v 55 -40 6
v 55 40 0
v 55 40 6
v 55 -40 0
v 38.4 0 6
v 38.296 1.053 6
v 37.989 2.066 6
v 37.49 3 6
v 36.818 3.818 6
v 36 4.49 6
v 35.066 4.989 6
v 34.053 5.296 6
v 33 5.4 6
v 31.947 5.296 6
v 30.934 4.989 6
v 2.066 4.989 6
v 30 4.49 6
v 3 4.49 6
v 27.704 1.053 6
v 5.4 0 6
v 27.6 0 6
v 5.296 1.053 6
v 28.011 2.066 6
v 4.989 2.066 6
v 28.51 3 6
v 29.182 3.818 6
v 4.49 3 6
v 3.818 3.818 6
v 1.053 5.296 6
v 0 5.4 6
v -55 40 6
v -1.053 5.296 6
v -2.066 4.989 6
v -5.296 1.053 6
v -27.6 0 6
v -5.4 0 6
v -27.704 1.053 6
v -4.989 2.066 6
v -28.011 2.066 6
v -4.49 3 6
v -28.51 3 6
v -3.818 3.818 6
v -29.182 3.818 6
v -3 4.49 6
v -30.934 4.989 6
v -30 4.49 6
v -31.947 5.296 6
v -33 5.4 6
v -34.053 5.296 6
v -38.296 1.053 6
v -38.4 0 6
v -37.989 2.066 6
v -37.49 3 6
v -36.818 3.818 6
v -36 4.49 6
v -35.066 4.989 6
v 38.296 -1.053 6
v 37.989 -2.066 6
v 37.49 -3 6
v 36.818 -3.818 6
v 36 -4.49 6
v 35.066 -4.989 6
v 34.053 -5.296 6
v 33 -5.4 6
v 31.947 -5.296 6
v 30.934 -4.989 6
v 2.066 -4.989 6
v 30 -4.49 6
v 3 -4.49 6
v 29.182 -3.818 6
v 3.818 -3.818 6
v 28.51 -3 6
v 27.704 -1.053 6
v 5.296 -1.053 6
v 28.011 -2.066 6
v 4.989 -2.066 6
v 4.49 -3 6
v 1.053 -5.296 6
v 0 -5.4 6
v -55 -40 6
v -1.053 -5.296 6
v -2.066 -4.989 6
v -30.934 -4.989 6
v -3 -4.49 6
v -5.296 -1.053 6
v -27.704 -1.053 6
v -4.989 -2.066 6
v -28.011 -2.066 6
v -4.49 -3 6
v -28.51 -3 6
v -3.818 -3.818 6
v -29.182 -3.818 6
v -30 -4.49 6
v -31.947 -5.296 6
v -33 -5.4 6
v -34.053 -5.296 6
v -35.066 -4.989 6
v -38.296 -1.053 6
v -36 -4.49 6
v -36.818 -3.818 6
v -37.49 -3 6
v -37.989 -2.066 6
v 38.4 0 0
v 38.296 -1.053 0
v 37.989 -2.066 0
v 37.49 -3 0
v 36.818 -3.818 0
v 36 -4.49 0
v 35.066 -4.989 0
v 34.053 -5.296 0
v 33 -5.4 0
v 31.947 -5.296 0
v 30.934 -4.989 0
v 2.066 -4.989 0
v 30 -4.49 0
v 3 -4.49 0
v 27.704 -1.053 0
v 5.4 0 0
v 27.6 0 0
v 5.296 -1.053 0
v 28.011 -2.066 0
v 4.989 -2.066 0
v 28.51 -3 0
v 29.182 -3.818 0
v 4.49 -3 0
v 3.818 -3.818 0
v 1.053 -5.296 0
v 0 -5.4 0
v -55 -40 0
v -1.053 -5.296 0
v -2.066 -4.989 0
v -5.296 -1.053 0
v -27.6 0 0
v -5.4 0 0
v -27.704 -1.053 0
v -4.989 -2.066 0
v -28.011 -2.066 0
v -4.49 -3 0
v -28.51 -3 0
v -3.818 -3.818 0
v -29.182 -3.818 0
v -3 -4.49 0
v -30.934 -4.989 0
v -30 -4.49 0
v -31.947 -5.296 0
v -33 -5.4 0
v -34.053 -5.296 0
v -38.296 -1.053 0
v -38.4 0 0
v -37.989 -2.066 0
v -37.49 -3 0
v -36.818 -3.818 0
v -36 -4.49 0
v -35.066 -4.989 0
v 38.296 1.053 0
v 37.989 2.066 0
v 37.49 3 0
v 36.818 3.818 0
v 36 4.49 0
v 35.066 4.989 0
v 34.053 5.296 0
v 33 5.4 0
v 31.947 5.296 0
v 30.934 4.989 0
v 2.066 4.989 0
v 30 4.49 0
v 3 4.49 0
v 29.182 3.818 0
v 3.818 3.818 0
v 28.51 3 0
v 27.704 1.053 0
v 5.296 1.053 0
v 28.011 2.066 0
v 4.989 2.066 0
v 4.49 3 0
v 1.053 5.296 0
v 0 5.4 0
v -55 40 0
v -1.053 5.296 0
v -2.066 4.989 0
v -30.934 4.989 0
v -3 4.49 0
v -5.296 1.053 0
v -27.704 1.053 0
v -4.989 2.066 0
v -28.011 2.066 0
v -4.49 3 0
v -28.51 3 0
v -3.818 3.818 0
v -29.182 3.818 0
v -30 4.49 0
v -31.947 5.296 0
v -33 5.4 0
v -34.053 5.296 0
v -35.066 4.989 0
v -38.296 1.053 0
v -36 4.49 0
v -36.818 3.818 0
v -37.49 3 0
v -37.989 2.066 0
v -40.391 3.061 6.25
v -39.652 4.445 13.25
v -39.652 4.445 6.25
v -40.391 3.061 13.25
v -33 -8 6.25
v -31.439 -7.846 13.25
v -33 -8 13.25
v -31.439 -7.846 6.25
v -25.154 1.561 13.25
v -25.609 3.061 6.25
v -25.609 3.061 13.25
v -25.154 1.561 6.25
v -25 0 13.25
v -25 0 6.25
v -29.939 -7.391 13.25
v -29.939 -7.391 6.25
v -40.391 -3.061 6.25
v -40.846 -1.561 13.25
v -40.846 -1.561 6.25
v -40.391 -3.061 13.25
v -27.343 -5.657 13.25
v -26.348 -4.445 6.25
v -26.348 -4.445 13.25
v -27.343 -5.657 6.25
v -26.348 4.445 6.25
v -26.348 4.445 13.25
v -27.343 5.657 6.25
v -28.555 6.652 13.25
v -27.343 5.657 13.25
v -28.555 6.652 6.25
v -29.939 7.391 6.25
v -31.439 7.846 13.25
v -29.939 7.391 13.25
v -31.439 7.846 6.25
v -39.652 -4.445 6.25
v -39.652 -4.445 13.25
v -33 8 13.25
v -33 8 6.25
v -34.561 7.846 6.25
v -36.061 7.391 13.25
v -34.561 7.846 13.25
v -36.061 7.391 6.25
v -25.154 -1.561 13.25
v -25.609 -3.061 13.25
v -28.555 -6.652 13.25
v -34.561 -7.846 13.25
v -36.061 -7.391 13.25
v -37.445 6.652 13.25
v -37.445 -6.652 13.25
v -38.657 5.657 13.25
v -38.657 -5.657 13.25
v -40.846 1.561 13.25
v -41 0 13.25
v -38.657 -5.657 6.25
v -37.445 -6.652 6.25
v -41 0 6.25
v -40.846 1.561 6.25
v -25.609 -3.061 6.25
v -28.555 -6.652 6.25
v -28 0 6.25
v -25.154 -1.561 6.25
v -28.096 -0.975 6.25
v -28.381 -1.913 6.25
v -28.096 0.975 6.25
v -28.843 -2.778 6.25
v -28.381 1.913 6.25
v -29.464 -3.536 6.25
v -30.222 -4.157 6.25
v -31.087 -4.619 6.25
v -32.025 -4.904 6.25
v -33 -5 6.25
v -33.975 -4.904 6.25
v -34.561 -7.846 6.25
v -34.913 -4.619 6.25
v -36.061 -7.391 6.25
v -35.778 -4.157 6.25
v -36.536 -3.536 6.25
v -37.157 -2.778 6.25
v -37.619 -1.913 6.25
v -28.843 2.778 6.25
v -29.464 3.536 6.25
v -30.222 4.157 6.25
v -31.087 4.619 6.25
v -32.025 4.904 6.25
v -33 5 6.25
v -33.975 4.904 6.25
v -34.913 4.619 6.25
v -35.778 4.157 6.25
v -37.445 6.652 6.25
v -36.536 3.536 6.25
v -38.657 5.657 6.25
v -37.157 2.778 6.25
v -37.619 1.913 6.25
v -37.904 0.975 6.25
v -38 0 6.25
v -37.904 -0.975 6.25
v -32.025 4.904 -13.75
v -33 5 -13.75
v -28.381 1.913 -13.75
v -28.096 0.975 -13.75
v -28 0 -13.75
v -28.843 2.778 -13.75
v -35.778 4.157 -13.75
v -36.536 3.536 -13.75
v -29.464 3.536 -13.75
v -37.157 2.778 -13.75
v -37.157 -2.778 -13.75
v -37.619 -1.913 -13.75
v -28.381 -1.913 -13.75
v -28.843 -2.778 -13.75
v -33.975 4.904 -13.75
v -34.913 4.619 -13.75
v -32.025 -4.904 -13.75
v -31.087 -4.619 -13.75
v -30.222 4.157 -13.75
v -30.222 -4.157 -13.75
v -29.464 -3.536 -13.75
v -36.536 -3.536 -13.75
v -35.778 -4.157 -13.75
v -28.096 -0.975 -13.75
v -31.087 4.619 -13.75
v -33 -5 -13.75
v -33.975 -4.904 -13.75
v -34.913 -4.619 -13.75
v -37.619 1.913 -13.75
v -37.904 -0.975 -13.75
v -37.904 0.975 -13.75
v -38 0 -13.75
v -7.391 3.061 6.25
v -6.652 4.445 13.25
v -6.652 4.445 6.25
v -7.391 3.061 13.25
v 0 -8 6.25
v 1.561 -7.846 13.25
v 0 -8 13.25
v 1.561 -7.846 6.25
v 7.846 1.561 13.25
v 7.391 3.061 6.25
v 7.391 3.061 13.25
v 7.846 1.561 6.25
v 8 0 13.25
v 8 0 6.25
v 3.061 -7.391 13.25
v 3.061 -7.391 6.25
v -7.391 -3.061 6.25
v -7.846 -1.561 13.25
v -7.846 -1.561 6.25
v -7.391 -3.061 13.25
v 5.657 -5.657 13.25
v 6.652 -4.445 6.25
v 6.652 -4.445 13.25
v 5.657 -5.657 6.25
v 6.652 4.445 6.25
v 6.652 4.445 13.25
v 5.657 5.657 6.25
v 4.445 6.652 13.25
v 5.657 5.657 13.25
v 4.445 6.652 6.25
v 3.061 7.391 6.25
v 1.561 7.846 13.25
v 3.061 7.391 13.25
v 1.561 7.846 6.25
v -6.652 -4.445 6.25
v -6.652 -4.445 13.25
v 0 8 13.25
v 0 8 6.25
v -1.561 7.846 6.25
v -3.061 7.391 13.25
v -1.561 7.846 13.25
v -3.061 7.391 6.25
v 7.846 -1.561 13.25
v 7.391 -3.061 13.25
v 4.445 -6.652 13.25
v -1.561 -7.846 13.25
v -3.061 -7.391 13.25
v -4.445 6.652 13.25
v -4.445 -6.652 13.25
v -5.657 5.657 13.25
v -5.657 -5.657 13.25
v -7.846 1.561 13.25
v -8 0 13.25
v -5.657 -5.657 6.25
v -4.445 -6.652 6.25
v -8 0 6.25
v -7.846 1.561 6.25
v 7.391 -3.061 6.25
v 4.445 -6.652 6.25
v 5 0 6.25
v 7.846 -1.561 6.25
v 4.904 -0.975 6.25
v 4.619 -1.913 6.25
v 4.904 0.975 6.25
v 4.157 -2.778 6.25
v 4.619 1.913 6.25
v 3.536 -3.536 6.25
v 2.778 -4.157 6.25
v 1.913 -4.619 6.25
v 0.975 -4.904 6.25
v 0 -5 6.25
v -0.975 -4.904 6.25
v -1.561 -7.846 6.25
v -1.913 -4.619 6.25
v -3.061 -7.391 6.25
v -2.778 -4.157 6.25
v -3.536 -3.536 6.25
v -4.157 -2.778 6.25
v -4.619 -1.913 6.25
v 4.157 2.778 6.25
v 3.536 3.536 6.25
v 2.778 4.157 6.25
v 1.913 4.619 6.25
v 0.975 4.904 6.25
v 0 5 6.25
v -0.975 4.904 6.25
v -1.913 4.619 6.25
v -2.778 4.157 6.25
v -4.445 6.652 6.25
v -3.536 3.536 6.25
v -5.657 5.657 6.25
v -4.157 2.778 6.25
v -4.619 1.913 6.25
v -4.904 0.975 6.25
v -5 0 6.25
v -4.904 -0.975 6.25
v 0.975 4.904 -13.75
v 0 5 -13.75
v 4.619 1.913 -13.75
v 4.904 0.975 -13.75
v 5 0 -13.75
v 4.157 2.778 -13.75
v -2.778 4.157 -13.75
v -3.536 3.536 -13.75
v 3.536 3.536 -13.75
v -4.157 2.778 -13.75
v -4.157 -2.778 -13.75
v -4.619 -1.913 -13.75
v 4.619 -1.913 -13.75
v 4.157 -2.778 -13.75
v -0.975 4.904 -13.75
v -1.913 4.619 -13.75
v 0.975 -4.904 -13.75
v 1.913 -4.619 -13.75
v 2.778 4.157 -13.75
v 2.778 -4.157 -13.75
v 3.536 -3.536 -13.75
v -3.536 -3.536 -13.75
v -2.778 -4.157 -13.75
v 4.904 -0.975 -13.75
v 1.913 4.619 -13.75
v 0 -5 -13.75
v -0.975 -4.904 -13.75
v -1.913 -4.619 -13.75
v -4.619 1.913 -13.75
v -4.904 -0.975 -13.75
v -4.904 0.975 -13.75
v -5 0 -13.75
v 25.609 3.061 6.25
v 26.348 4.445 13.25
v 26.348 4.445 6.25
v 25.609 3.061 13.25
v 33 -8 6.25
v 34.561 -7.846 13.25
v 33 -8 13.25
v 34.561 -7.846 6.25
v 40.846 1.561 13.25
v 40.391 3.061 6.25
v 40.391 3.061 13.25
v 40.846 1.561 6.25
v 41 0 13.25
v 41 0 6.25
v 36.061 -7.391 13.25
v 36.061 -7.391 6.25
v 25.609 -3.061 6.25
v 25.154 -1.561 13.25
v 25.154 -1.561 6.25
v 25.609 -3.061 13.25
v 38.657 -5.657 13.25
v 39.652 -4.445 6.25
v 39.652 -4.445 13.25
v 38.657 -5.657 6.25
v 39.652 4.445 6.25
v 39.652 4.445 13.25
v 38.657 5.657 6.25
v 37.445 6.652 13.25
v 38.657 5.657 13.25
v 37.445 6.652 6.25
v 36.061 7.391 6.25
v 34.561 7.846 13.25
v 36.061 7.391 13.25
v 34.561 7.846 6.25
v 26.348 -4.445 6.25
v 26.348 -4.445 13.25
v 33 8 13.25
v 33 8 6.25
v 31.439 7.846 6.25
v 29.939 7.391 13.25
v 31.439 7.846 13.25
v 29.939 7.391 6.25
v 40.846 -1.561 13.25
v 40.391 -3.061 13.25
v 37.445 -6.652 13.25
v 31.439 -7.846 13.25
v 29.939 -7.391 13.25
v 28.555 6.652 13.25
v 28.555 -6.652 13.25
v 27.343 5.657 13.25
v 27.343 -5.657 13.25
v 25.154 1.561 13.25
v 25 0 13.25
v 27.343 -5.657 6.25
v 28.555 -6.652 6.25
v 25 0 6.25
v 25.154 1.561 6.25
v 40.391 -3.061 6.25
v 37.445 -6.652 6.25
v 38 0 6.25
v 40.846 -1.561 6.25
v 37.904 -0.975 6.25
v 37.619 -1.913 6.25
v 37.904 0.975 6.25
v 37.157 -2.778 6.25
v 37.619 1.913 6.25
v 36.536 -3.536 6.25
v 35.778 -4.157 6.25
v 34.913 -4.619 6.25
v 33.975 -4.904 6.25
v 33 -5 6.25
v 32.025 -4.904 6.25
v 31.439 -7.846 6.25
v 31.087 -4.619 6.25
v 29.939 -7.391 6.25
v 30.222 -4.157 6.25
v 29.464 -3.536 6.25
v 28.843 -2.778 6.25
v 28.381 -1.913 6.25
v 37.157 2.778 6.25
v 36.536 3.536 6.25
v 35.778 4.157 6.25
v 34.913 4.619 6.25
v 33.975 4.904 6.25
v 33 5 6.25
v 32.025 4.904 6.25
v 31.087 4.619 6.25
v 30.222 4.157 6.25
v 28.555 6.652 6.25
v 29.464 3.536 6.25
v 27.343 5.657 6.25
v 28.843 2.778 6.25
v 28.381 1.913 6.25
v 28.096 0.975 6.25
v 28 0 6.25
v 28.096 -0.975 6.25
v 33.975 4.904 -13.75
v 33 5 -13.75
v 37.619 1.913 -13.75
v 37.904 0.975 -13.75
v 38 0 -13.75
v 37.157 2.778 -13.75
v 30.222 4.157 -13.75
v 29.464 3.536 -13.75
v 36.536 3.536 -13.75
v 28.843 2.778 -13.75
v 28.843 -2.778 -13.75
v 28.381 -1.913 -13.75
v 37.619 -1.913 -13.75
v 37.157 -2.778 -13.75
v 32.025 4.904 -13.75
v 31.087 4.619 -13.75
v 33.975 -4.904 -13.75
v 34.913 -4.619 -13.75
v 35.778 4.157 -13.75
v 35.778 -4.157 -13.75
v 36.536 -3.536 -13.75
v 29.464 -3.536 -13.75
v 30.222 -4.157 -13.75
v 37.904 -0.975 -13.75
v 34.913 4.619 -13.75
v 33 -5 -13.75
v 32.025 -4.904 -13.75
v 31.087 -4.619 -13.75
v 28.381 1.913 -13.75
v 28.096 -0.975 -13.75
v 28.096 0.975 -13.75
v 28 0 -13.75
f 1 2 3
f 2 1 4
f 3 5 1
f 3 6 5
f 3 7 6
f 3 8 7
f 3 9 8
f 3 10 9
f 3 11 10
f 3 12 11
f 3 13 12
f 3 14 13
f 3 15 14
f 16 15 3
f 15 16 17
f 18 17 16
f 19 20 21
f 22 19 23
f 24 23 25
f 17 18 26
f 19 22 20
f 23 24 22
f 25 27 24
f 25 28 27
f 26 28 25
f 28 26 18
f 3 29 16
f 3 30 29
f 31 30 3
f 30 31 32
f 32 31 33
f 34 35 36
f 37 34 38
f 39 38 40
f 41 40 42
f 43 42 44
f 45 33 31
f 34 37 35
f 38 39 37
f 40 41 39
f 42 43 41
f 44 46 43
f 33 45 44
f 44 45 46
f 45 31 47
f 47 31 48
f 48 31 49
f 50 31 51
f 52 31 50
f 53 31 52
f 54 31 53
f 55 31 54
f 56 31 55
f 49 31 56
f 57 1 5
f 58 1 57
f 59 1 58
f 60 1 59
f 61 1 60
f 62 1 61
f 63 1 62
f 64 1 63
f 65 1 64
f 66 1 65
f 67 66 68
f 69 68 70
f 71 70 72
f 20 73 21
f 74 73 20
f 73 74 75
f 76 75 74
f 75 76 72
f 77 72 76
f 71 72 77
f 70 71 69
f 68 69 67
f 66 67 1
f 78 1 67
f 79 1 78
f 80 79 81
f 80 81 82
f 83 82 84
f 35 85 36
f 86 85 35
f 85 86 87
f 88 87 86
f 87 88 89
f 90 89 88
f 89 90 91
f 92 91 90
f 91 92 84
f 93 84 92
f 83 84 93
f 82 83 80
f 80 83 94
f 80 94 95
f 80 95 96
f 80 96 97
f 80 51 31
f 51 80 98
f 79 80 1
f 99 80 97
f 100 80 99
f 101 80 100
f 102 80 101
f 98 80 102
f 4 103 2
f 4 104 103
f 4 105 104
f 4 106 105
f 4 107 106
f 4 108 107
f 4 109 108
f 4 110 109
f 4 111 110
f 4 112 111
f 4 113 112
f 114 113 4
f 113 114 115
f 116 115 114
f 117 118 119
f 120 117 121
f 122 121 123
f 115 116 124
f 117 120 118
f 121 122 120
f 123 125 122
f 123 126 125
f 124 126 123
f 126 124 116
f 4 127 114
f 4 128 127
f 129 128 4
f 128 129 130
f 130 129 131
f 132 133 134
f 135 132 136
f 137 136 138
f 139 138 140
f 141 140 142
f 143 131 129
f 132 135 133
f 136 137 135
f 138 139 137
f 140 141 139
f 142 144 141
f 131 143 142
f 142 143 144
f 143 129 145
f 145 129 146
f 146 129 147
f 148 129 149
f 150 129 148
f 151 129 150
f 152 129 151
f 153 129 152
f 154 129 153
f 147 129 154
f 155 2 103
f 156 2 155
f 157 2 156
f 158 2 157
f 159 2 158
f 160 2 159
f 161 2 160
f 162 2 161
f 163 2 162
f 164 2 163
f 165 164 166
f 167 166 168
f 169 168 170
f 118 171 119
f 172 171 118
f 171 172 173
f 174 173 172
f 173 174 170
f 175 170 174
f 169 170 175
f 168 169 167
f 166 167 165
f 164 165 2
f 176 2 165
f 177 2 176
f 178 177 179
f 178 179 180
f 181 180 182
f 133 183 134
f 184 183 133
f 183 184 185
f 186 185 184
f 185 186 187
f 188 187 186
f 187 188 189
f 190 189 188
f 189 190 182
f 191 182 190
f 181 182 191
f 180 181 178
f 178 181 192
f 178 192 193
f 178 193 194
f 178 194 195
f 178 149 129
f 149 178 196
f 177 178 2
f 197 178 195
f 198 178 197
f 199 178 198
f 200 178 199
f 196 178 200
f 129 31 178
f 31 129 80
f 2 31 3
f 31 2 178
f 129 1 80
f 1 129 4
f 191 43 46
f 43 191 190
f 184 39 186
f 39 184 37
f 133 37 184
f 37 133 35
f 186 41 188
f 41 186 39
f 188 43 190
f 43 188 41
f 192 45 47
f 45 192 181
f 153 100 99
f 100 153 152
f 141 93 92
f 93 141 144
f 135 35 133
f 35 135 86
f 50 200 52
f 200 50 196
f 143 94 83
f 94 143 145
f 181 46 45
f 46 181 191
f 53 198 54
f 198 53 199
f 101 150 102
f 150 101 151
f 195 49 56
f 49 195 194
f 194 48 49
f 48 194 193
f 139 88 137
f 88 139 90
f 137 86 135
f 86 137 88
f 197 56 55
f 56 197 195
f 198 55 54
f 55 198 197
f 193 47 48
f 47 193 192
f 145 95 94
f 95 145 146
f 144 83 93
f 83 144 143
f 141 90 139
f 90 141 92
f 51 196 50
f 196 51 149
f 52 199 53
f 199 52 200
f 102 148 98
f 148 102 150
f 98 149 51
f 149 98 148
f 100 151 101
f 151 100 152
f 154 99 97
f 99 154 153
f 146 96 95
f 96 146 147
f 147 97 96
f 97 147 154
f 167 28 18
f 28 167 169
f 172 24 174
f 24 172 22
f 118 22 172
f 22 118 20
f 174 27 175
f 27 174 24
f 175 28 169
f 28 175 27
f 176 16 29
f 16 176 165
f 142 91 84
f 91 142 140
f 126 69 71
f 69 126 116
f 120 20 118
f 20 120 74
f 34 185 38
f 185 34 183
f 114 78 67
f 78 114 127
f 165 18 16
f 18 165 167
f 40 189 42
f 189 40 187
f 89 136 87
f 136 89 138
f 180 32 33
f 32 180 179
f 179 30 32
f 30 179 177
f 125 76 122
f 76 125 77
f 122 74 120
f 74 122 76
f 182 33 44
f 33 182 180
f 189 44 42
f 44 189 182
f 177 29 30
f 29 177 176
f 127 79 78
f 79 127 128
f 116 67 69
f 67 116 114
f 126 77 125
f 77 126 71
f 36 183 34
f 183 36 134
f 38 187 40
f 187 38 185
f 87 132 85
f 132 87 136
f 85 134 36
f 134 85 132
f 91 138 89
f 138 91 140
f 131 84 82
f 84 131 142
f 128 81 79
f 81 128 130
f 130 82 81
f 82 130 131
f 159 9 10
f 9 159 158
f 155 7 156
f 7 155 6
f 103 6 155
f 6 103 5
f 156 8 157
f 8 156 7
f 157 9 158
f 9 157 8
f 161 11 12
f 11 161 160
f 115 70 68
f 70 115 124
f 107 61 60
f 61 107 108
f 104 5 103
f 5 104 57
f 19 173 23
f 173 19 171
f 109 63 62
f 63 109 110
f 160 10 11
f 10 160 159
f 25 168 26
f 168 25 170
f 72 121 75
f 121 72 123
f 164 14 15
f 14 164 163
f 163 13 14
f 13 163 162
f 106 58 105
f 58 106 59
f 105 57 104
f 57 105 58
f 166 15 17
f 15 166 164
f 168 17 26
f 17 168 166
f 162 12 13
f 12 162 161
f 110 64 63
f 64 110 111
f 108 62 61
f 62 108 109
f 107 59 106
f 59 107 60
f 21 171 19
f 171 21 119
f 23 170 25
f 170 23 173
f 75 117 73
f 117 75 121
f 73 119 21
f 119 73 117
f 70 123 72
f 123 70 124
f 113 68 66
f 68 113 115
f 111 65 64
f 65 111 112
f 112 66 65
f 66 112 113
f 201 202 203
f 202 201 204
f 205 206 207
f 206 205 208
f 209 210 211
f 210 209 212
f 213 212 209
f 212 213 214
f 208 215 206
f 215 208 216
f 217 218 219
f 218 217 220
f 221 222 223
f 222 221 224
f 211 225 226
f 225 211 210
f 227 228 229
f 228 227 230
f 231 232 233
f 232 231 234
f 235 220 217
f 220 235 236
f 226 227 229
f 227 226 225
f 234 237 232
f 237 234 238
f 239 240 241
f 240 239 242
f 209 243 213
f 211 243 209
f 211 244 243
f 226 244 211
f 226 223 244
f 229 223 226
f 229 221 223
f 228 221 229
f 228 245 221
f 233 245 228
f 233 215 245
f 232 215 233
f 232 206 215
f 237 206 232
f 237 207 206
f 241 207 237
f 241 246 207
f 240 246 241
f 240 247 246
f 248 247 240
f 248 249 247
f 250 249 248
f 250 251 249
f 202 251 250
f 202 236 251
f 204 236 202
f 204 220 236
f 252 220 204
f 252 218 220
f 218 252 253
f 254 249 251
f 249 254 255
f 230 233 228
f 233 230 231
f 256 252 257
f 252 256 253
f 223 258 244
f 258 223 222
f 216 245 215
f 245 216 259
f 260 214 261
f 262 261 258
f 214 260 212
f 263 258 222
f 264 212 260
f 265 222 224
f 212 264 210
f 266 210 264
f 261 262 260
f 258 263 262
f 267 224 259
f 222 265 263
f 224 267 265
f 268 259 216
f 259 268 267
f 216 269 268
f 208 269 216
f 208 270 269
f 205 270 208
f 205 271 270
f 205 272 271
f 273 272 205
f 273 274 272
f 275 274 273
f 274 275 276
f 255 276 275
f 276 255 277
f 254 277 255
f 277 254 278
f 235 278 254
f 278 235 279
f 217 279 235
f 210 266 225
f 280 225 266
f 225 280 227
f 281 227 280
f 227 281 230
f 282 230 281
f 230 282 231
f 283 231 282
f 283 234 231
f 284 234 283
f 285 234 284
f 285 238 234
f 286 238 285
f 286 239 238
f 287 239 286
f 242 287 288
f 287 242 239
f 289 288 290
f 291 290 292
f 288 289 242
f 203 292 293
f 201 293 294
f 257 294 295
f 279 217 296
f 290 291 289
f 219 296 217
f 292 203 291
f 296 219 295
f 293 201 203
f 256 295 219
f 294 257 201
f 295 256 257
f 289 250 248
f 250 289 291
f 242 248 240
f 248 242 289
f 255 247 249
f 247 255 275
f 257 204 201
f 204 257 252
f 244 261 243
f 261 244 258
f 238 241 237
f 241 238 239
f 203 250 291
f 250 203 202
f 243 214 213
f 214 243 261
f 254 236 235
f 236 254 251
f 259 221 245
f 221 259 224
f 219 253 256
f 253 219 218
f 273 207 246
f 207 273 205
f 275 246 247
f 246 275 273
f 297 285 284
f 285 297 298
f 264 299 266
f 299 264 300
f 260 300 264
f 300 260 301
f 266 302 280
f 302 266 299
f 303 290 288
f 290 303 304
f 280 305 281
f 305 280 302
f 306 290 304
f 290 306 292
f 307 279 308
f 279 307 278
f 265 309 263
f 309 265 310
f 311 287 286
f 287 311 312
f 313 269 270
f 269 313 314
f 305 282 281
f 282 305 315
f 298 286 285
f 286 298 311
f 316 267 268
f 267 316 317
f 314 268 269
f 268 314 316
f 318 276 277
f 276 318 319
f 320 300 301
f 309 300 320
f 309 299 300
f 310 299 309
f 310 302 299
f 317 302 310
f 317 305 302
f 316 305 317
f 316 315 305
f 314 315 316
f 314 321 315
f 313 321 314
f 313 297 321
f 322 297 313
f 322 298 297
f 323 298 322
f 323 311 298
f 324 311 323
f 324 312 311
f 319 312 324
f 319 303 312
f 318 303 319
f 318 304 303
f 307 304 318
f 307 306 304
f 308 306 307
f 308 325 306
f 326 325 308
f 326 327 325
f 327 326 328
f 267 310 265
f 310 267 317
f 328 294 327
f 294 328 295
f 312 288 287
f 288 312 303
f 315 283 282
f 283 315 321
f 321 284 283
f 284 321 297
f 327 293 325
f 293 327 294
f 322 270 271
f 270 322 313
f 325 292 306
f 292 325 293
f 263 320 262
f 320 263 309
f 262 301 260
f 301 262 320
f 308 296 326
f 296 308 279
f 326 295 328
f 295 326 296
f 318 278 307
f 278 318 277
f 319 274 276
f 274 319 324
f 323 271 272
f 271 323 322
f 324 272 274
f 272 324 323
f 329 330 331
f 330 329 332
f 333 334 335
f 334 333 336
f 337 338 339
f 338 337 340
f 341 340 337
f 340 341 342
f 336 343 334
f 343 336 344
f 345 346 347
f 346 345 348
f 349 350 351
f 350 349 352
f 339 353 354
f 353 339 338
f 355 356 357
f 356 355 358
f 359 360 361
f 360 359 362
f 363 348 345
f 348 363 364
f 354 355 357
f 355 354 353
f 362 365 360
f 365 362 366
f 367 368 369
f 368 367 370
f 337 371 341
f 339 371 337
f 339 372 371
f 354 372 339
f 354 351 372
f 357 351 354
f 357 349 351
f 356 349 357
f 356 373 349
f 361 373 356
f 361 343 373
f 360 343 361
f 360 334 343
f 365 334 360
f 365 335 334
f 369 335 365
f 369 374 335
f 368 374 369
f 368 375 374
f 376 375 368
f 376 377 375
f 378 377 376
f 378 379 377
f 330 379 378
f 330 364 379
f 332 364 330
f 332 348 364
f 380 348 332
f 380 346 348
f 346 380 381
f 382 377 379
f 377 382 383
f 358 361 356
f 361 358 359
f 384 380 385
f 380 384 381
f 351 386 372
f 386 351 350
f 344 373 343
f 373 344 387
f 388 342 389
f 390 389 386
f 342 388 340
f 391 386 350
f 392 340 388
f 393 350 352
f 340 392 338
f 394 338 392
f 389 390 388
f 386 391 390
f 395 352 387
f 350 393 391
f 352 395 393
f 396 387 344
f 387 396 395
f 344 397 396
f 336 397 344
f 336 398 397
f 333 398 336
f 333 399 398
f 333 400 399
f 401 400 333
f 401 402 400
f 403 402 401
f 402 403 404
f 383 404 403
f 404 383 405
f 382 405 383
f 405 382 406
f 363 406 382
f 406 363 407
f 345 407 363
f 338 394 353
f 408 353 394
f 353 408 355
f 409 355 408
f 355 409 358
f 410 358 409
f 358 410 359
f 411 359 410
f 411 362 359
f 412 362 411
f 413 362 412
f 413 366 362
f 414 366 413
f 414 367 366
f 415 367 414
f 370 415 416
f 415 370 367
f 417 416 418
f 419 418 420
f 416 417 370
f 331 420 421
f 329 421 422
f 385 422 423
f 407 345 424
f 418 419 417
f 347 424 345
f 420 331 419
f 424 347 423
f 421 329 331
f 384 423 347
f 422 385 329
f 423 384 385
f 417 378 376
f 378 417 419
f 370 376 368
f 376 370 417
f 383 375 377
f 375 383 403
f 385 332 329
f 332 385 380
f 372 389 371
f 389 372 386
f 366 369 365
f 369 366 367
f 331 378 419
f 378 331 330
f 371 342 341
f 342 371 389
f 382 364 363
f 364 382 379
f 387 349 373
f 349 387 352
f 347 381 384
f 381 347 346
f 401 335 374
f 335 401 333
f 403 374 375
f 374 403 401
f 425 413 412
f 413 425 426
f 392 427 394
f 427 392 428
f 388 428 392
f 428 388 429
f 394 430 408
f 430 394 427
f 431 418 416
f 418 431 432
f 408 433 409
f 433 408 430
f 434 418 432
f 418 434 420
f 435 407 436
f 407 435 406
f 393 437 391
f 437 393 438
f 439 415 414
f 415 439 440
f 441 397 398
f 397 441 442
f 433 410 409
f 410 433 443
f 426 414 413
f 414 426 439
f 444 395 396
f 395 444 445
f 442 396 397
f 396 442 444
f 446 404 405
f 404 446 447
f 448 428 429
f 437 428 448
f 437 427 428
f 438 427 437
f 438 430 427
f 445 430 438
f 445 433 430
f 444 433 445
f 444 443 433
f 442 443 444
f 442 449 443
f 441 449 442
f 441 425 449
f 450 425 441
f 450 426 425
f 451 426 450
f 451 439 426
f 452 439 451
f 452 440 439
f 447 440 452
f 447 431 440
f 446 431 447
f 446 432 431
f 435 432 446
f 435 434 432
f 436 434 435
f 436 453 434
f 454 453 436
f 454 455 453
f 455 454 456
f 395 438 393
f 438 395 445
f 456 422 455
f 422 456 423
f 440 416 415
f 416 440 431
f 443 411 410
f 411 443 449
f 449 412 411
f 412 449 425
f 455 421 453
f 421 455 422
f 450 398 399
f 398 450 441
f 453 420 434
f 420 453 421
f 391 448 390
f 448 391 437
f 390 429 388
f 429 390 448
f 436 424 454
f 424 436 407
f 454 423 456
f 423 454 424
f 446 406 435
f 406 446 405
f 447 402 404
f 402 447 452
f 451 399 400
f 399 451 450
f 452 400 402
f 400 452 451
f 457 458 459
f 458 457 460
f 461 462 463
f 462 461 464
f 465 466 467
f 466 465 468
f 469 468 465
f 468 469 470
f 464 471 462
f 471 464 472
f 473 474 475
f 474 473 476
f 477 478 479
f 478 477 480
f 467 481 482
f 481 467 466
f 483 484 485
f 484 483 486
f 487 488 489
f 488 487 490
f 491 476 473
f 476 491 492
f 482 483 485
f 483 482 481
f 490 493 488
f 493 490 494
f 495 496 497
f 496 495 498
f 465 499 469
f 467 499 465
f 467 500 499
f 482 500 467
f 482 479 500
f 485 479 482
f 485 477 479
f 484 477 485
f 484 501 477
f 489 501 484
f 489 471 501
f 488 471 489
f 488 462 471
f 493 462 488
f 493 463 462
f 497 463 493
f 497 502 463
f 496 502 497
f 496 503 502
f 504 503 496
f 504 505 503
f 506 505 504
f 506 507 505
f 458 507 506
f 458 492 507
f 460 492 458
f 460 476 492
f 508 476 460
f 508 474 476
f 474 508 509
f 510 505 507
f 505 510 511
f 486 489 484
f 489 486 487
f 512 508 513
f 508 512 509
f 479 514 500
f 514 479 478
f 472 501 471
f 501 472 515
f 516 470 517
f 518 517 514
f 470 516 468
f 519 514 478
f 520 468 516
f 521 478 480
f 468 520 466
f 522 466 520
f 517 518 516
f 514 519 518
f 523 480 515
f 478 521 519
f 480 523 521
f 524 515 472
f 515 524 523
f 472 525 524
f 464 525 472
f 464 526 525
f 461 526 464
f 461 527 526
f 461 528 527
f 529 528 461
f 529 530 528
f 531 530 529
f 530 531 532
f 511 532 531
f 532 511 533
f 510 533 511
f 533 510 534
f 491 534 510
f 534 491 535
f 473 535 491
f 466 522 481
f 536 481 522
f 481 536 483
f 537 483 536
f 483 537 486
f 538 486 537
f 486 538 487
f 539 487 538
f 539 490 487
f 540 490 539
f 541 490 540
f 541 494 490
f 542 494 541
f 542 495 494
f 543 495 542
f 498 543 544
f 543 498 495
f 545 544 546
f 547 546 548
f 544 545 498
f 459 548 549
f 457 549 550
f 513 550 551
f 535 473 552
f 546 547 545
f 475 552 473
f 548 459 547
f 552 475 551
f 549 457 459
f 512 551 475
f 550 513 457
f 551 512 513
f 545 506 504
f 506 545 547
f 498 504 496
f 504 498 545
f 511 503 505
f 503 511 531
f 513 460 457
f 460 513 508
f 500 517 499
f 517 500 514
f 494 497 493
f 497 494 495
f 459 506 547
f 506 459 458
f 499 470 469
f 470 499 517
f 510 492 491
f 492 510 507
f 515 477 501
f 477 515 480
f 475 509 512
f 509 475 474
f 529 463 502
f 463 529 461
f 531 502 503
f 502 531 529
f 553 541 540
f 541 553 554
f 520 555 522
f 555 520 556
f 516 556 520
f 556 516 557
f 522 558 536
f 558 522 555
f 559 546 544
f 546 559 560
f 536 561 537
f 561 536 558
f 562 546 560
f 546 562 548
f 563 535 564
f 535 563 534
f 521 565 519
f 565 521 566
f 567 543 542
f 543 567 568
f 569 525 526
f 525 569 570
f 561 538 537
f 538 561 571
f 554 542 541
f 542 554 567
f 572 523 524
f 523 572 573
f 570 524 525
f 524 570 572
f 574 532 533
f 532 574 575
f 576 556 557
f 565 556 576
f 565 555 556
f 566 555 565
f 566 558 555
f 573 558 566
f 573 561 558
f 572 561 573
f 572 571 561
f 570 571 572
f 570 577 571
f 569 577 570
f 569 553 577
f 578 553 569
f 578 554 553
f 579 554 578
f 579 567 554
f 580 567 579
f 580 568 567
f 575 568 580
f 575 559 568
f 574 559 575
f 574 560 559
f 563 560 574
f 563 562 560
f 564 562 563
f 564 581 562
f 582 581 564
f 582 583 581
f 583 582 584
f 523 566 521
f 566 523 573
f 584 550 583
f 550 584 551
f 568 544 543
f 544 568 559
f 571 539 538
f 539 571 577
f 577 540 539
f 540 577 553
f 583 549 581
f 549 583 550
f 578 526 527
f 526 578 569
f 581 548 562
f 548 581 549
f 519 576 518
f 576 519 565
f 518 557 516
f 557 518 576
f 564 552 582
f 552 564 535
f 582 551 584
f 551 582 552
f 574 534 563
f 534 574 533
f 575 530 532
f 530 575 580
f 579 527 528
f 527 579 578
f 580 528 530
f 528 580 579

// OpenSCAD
$fn = 32;

// ------------------------------------------------------------------------
// Bolted plate: 110 x 80 x 6 mm plate, 3 fasteners
// Every part is its own module, assembly() places them once.
// ------------------------------------------------------------------------

// --- part 1 ---
module plate() {
  difference() {
    translate([-55, -40, 0]) cube([110, 80, 6]);
    translate([-33, 0, -1]) cylinder(h = 8, d = 10.8);
    translate([0, 0, -1]) cylinder(h = 8, d = 10.8);
    translate([33, 0, -1]) cylinder(h = 8, d = 10.8);
  }
}

// --- part 2 ---
module bolt1() {
  cylinder(h = 7, d = 16);
  translate([0, 0, -20]) cylinder(h = 20, d = 10);
}

// --- part 3 ---
module bolt2() {
  cylinder(h = 7, d = 16);
  translate([0, 0, -20]) cylinder(h = 20, d = 10);
}

// --- part 4 ---
module bolt3() {
  cylinder(h = 7, d = 16);
  translate([0, 0, -20]) cylinder(h = 20, d = 10);
}

// --- assembly ---
module assembly() {
  translate([0, 0, 0]) rotate([0, 0, 0]) plate();
  translate([-33, 0, 6.25]) rotate([0, 0, 0]) bolt1();
  translate([0, 0, 6.25]) rotate([0, 0, 0]) bolt2();
  translate([33, 0, 6.25]) rotate([0, 0, 0]) bolt3();
}

assembly();
